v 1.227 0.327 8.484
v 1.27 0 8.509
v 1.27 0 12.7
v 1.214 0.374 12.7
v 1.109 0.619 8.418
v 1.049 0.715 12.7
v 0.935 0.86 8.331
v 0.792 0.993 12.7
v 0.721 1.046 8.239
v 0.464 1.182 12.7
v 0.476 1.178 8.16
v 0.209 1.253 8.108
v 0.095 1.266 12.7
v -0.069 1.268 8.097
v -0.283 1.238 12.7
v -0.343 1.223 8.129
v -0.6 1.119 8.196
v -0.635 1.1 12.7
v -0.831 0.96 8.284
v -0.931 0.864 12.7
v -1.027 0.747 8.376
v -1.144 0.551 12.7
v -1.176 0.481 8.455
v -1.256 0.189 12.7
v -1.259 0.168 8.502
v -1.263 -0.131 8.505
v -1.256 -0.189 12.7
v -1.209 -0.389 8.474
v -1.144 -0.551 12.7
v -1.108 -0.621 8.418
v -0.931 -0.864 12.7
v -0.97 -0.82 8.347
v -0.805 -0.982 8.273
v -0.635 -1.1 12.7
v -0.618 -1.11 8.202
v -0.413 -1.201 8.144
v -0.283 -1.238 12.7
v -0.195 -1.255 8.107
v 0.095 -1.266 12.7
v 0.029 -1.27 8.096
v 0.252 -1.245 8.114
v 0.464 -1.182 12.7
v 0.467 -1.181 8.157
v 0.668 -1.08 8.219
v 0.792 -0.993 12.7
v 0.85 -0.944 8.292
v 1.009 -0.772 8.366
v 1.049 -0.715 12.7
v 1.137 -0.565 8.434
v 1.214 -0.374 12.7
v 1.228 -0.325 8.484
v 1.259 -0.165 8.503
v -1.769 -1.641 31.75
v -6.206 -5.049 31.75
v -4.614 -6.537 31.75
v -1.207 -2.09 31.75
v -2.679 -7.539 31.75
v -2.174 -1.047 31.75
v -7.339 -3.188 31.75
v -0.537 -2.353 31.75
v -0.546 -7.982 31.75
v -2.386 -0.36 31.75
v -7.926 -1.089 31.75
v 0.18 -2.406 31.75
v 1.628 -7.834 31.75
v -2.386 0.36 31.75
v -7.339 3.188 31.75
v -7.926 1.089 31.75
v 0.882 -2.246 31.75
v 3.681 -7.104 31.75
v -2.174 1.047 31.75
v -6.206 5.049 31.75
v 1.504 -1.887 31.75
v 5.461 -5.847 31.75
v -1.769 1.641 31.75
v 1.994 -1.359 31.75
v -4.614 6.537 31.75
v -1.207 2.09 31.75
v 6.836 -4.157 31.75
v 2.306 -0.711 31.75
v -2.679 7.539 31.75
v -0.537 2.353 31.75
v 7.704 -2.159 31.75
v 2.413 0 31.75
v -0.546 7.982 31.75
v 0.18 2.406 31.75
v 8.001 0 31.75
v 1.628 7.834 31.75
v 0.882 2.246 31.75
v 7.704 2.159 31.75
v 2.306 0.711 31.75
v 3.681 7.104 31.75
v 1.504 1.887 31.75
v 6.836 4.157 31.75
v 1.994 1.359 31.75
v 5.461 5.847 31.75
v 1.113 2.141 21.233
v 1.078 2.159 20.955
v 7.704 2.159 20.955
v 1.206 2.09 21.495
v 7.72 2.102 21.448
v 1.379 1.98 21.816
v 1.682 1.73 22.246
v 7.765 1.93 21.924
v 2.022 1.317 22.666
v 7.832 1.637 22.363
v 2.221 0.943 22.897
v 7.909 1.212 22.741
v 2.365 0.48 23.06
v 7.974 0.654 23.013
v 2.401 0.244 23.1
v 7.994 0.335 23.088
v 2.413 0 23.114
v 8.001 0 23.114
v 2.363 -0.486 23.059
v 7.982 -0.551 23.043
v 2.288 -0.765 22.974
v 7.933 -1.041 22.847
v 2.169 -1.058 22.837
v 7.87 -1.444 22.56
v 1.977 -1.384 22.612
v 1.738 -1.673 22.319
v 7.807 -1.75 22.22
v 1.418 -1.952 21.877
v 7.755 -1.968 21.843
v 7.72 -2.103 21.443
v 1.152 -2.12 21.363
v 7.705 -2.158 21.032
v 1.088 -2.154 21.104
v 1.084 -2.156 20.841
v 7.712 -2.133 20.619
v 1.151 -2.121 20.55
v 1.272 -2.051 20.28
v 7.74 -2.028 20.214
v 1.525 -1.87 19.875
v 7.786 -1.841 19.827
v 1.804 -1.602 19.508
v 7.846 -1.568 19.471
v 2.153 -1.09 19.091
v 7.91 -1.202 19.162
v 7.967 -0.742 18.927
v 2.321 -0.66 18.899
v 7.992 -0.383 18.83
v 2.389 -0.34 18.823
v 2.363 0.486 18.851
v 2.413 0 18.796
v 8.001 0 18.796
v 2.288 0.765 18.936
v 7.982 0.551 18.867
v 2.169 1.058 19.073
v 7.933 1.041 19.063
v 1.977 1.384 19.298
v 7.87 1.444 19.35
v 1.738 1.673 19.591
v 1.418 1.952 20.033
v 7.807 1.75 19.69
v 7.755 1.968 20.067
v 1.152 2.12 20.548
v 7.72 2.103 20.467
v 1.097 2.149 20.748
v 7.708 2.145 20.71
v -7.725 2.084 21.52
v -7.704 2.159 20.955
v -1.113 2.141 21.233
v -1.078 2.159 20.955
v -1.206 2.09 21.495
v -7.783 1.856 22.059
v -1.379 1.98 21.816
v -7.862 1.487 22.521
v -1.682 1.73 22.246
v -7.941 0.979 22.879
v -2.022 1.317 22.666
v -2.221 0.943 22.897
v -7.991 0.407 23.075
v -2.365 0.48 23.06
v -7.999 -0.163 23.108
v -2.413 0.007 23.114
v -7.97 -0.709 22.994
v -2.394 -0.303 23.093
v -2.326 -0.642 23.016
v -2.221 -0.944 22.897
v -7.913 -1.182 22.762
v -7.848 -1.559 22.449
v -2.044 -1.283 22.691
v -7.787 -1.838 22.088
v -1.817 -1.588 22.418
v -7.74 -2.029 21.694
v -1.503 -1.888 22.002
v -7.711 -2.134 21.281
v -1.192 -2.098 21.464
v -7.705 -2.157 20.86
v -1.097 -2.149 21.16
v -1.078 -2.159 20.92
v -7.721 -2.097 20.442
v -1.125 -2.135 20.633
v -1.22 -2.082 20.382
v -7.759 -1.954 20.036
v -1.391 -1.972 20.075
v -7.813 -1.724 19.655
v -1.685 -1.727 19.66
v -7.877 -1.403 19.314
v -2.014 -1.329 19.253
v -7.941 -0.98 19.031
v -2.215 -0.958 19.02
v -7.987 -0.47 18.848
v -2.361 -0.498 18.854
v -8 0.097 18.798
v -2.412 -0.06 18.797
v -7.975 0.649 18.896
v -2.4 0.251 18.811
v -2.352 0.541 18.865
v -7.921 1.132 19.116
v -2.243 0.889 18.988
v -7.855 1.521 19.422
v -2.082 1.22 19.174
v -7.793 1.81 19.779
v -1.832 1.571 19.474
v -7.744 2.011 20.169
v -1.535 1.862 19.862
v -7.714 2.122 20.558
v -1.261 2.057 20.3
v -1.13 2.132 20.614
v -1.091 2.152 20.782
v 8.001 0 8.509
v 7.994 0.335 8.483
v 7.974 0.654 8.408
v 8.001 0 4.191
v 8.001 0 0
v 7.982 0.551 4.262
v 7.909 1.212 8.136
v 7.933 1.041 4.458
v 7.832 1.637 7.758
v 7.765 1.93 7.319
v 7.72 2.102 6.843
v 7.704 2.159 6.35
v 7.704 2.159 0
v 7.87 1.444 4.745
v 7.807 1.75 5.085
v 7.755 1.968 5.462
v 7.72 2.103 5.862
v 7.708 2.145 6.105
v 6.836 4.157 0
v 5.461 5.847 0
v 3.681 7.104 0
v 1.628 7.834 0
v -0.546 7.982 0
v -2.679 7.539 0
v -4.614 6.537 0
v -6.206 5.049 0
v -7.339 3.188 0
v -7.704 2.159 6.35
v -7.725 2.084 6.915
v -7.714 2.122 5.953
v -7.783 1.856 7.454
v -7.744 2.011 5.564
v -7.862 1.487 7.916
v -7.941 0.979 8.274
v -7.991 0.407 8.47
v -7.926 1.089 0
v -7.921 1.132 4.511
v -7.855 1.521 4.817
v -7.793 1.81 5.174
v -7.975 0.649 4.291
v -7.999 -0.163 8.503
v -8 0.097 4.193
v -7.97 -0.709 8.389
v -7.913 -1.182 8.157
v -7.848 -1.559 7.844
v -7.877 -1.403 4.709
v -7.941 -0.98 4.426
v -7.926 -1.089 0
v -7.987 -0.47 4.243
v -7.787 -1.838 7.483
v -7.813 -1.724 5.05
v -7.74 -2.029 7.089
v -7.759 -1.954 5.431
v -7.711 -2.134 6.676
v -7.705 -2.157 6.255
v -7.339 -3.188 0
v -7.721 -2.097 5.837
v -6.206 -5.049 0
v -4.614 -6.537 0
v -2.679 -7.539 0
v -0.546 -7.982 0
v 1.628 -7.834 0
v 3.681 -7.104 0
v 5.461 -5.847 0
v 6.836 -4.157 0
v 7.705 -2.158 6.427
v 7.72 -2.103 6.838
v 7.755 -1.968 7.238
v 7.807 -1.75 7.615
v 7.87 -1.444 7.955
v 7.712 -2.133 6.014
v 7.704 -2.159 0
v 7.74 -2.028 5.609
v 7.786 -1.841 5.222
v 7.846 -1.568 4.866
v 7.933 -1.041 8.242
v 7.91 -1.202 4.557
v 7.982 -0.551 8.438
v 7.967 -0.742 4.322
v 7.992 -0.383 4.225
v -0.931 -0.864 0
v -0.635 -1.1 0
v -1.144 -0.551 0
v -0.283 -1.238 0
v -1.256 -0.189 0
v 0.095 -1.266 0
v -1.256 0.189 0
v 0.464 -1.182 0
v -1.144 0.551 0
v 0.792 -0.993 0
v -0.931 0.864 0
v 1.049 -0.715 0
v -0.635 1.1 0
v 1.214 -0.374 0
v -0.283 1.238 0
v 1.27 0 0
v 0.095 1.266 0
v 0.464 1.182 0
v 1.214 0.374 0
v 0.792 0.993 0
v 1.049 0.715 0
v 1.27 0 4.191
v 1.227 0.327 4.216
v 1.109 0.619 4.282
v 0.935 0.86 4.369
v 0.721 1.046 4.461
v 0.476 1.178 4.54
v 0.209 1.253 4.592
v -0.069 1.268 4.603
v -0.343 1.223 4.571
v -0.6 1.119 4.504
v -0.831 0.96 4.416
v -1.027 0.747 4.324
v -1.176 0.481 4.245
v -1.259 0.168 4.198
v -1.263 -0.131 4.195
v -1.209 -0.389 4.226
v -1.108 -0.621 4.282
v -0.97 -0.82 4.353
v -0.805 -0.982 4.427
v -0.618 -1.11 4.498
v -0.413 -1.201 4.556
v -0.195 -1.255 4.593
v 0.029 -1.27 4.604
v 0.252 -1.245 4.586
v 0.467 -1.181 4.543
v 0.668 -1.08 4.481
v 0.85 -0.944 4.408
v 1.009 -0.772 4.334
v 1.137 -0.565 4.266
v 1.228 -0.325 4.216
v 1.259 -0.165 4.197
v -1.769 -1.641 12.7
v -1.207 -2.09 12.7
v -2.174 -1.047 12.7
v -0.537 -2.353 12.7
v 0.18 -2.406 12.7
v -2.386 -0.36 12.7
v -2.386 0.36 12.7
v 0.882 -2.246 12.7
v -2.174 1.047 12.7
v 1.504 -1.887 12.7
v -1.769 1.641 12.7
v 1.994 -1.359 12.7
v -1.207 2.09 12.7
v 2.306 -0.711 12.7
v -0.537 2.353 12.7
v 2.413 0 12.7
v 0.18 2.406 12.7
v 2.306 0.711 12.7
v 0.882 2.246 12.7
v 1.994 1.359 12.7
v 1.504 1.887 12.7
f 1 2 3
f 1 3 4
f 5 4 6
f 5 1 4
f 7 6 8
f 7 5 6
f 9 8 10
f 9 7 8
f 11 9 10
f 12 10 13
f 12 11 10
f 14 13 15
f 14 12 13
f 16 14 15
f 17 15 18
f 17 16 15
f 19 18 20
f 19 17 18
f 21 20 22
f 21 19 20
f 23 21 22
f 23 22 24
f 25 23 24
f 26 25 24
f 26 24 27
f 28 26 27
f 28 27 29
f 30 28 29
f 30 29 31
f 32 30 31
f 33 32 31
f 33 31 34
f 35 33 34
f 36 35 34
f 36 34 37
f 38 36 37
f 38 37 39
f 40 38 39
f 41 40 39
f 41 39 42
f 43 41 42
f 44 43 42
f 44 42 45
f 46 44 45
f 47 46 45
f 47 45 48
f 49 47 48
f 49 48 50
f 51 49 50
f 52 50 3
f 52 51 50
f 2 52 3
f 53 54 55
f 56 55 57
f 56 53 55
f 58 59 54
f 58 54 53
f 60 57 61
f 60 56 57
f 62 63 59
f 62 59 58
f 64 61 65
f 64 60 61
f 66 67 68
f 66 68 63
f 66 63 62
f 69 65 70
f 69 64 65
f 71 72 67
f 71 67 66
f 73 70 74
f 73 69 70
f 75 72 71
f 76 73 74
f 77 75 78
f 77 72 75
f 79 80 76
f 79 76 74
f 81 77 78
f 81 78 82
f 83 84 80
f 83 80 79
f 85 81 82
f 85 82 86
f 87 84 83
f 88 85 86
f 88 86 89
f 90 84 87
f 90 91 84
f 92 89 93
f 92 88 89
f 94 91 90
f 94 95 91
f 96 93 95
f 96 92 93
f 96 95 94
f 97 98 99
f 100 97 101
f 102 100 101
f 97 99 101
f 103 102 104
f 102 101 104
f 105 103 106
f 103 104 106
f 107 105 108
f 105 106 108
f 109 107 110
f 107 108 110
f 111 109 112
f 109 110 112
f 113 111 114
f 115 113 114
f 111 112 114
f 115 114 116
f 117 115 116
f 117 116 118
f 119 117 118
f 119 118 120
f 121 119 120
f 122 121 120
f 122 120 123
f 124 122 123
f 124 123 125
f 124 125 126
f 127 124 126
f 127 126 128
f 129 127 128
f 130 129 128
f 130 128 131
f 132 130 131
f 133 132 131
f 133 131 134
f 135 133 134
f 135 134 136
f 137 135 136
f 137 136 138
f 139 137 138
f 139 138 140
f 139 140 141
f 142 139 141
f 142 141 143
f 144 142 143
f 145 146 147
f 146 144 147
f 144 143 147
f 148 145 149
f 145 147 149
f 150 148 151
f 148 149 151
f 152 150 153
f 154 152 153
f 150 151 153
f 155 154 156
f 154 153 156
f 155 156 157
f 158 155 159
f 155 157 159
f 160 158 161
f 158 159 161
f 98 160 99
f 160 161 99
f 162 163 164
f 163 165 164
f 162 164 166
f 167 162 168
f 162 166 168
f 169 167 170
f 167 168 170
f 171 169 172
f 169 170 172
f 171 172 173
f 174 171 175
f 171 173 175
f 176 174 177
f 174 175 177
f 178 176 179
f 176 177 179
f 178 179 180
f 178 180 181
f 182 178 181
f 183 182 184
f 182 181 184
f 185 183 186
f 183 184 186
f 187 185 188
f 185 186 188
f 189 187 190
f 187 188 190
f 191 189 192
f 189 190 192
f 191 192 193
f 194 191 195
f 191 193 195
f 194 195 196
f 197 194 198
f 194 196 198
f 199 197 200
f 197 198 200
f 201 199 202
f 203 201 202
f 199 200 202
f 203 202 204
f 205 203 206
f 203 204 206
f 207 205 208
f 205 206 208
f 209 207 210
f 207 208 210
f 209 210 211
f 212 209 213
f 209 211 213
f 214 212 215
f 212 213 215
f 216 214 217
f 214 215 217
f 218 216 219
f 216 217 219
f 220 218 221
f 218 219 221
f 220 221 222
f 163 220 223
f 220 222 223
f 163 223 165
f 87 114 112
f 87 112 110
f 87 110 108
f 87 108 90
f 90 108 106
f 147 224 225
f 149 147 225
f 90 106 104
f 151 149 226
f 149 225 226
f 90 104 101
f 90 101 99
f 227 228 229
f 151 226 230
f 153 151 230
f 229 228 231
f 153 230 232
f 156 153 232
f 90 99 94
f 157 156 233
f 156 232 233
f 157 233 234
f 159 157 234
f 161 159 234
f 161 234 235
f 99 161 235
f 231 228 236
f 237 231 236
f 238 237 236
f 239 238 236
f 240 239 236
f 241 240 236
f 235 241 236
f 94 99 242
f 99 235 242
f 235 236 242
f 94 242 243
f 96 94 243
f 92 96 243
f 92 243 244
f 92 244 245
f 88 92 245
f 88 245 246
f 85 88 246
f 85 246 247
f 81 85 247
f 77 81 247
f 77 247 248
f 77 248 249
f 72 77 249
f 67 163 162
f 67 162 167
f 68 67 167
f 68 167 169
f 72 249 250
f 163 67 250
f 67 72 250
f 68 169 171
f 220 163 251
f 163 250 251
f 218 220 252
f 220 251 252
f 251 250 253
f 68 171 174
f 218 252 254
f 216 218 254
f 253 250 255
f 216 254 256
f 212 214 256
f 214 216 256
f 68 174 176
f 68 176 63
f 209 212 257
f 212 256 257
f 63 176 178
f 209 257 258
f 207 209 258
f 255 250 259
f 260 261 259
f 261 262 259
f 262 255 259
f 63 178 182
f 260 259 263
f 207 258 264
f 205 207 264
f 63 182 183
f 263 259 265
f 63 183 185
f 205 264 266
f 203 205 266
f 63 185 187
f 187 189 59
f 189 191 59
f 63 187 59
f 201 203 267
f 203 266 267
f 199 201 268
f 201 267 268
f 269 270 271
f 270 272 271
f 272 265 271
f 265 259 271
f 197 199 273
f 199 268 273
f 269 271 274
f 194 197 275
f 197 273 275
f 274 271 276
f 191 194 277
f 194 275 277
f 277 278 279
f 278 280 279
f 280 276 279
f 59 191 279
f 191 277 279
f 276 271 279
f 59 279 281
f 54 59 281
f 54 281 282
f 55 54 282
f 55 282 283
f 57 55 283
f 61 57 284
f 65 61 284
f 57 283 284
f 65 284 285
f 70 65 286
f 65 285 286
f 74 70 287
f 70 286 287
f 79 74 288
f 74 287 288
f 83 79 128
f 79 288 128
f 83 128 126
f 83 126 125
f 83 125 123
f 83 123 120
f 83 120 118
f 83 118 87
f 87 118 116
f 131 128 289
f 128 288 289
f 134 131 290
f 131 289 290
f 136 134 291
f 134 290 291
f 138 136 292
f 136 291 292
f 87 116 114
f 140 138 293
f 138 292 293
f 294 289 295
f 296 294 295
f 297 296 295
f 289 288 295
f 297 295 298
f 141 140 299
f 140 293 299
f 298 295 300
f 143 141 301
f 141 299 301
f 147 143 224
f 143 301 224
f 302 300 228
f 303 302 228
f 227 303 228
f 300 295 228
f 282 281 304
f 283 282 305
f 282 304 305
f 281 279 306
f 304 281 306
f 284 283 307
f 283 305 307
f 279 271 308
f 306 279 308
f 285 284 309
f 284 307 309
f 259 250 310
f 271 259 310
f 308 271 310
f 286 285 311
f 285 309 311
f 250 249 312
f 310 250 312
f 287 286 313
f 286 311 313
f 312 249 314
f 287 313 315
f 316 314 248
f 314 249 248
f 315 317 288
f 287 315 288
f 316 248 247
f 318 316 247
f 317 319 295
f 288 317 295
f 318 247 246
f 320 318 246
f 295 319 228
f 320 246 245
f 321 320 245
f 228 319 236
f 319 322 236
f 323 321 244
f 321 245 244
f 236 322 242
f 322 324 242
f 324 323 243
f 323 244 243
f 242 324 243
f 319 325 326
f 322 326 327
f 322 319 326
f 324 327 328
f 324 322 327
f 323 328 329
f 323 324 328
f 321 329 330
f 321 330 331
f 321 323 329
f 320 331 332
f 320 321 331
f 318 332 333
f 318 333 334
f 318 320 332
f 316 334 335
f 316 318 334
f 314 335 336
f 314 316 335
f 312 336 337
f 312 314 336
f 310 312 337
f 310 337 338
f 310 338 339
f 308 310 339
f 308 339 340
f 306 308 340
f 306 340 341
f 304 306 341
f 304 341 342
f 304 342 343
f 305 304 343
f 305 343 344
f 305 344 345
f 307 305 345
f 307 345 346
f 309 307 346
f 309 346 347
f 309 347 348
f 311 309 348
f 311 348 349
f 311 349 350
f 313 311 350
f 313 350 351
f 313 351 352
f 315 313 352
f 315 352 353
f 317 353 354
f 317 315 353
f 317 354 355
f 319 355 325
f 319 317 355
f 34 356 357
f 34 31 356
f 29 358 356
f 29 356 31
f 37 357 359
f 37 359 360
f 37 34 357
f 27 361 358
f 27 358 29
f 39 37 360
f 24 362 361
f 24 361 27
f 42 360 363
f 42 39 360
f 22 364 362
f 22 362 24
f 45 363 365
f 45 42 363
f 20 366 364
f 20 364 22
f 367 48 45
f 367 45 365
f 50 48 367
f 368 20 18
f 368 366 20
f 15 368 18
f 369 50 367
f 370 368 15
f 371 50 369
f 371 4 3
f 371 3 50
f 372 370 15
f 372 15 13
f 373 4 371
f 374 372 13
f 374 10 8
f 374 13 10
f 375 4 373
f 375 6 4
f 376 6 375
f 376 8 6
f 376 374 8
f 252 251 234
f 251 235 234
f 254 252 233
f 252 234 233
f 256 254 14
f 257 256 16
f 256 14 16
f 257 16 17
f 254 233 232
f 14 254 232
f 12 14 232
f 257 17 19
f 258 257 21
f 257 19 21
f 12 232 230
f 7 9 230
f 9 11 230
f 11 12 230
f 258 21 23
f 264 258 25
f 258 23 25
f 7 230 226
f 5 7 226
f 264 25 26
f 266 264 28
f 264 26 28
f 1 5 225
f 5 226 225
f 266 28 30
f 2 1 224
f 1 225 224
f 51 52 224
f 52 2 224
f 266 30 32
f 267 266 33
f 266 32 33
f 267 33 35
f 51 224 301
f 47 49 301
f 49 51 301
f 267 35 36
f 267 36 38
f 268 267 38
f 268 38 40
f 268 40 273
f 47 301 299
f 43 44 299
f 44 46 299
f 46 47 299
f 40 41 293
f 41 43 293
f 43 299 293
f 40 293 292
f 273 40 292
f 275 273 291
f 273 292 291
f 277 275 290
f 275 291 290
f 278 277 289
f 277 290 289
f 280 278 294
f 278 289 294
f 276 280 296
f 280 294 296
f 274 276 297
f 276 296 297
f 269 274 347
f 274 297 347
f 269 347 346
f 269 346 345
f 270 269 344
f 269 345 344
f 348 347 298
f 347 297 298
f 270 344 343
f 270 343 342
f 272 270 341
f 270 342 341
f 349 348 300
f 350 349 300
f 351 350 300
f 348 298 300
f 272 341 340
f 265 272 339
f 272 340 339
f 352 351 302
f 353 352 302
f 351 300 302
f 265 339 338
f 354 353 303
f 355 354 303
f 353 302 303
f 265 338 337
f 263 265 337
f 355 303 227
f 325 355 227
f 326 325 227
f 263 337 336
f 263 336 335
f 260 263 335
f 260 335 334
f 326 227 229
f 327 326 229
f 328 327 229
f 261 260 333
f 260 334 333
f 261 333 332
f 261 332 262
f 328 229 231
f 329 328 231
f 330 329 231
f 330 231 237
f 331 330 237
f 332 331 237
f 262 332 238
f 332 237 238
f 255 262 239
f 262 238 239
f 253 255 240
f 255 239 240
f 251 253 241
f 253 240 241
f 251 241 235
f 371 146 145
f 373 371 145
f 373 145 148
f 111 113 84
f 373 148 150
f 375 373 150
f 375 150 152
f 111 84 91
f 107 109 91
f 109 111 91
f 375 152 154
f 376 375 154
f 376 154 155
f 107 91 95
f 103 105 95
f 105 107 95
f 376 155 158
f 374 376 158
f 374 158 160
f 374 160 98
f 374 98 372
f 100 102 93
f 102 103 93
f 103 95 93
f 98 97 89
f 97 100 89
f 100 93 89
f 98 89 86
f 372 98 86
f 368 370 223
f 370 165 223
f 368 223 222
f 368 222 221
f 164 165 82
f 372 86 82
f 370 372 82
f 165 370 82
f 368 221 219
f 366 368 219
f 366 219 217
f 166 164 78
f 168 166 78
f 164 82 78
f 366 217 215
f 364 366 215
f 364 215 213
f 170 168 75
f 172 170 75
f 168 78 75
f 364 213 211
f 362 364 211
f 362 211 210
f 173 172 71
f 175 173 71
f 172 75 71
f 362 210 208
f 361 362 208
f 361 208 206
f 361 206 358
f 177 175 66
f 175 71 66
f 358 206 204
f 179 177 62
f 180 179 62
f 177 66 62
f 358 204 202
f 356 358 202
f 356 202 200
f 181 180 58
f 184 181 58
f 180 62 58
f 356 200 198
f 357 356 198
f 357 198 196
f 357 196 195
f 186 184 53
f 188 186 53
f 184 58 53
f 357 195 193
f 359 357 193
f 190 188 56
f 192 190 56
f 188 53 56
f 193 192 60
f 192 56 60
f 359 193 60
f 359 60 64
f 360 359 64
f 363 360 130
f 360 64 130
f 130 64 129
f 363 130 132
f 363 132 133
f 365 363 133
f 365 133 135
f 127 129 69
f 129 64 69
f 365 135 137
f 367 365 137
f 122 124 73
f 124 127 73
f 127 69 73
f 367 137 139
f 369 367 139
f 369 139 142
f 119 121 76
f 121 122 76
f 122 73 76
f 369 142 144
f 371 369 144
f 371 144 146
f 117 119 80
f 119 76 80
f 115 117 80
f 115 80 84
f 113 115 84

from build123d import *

# Parameters (mm, degrees)
F0_R     = 8.001
F0_R_2   = 1.27
F1_DEPTH = 31.75
F2_R     = 2.413
F2_R_2   = 1.27
F3_DEPTH = 19.05
F4_R     = 2.159
F5_DEPTH = 12.7
F6_DEPTH = 12.7


with BuildPart() as f1:
    # F0 (on Top) → F1 (new body)
    with BuildSketch(Plane.XY):
        Circle(F0_R)
        Circle(F0_R_2, mode=Mode.SUBTRACT)
    extrude(amount=F1_DEPTH)

    # F2 (on face) → F3 (cut)
    with BuildSketch(Plane.XY.offset(31.75)):
        Circle(F2_R)
        Circle(F2_R_2, mode=Mode.SUBTRACT)
    extrude(amount=-F3_DEPTH, mode=Mode.SUBTRACT)

    # F4 (on Right) → F5 (cut, symmetric)
    with BuildSketch(Plane.YZ):
        with Locations((0, 20.955)):
            Circle(F4_R)
    extrude(amount=F5_DEPTH, both=True, mode=Mode.SUBTRACT)

    # F4 (on Right) → F6 (cut, symmetric)
    with BuildSketch(Plane.YZ):
        with Locations((0, 6.35)):
            Circle(F4_R)
    extrude(amount=F6_DEPTH, both=True, mode=Mode.SUBTRACT)


solid = f1.part
